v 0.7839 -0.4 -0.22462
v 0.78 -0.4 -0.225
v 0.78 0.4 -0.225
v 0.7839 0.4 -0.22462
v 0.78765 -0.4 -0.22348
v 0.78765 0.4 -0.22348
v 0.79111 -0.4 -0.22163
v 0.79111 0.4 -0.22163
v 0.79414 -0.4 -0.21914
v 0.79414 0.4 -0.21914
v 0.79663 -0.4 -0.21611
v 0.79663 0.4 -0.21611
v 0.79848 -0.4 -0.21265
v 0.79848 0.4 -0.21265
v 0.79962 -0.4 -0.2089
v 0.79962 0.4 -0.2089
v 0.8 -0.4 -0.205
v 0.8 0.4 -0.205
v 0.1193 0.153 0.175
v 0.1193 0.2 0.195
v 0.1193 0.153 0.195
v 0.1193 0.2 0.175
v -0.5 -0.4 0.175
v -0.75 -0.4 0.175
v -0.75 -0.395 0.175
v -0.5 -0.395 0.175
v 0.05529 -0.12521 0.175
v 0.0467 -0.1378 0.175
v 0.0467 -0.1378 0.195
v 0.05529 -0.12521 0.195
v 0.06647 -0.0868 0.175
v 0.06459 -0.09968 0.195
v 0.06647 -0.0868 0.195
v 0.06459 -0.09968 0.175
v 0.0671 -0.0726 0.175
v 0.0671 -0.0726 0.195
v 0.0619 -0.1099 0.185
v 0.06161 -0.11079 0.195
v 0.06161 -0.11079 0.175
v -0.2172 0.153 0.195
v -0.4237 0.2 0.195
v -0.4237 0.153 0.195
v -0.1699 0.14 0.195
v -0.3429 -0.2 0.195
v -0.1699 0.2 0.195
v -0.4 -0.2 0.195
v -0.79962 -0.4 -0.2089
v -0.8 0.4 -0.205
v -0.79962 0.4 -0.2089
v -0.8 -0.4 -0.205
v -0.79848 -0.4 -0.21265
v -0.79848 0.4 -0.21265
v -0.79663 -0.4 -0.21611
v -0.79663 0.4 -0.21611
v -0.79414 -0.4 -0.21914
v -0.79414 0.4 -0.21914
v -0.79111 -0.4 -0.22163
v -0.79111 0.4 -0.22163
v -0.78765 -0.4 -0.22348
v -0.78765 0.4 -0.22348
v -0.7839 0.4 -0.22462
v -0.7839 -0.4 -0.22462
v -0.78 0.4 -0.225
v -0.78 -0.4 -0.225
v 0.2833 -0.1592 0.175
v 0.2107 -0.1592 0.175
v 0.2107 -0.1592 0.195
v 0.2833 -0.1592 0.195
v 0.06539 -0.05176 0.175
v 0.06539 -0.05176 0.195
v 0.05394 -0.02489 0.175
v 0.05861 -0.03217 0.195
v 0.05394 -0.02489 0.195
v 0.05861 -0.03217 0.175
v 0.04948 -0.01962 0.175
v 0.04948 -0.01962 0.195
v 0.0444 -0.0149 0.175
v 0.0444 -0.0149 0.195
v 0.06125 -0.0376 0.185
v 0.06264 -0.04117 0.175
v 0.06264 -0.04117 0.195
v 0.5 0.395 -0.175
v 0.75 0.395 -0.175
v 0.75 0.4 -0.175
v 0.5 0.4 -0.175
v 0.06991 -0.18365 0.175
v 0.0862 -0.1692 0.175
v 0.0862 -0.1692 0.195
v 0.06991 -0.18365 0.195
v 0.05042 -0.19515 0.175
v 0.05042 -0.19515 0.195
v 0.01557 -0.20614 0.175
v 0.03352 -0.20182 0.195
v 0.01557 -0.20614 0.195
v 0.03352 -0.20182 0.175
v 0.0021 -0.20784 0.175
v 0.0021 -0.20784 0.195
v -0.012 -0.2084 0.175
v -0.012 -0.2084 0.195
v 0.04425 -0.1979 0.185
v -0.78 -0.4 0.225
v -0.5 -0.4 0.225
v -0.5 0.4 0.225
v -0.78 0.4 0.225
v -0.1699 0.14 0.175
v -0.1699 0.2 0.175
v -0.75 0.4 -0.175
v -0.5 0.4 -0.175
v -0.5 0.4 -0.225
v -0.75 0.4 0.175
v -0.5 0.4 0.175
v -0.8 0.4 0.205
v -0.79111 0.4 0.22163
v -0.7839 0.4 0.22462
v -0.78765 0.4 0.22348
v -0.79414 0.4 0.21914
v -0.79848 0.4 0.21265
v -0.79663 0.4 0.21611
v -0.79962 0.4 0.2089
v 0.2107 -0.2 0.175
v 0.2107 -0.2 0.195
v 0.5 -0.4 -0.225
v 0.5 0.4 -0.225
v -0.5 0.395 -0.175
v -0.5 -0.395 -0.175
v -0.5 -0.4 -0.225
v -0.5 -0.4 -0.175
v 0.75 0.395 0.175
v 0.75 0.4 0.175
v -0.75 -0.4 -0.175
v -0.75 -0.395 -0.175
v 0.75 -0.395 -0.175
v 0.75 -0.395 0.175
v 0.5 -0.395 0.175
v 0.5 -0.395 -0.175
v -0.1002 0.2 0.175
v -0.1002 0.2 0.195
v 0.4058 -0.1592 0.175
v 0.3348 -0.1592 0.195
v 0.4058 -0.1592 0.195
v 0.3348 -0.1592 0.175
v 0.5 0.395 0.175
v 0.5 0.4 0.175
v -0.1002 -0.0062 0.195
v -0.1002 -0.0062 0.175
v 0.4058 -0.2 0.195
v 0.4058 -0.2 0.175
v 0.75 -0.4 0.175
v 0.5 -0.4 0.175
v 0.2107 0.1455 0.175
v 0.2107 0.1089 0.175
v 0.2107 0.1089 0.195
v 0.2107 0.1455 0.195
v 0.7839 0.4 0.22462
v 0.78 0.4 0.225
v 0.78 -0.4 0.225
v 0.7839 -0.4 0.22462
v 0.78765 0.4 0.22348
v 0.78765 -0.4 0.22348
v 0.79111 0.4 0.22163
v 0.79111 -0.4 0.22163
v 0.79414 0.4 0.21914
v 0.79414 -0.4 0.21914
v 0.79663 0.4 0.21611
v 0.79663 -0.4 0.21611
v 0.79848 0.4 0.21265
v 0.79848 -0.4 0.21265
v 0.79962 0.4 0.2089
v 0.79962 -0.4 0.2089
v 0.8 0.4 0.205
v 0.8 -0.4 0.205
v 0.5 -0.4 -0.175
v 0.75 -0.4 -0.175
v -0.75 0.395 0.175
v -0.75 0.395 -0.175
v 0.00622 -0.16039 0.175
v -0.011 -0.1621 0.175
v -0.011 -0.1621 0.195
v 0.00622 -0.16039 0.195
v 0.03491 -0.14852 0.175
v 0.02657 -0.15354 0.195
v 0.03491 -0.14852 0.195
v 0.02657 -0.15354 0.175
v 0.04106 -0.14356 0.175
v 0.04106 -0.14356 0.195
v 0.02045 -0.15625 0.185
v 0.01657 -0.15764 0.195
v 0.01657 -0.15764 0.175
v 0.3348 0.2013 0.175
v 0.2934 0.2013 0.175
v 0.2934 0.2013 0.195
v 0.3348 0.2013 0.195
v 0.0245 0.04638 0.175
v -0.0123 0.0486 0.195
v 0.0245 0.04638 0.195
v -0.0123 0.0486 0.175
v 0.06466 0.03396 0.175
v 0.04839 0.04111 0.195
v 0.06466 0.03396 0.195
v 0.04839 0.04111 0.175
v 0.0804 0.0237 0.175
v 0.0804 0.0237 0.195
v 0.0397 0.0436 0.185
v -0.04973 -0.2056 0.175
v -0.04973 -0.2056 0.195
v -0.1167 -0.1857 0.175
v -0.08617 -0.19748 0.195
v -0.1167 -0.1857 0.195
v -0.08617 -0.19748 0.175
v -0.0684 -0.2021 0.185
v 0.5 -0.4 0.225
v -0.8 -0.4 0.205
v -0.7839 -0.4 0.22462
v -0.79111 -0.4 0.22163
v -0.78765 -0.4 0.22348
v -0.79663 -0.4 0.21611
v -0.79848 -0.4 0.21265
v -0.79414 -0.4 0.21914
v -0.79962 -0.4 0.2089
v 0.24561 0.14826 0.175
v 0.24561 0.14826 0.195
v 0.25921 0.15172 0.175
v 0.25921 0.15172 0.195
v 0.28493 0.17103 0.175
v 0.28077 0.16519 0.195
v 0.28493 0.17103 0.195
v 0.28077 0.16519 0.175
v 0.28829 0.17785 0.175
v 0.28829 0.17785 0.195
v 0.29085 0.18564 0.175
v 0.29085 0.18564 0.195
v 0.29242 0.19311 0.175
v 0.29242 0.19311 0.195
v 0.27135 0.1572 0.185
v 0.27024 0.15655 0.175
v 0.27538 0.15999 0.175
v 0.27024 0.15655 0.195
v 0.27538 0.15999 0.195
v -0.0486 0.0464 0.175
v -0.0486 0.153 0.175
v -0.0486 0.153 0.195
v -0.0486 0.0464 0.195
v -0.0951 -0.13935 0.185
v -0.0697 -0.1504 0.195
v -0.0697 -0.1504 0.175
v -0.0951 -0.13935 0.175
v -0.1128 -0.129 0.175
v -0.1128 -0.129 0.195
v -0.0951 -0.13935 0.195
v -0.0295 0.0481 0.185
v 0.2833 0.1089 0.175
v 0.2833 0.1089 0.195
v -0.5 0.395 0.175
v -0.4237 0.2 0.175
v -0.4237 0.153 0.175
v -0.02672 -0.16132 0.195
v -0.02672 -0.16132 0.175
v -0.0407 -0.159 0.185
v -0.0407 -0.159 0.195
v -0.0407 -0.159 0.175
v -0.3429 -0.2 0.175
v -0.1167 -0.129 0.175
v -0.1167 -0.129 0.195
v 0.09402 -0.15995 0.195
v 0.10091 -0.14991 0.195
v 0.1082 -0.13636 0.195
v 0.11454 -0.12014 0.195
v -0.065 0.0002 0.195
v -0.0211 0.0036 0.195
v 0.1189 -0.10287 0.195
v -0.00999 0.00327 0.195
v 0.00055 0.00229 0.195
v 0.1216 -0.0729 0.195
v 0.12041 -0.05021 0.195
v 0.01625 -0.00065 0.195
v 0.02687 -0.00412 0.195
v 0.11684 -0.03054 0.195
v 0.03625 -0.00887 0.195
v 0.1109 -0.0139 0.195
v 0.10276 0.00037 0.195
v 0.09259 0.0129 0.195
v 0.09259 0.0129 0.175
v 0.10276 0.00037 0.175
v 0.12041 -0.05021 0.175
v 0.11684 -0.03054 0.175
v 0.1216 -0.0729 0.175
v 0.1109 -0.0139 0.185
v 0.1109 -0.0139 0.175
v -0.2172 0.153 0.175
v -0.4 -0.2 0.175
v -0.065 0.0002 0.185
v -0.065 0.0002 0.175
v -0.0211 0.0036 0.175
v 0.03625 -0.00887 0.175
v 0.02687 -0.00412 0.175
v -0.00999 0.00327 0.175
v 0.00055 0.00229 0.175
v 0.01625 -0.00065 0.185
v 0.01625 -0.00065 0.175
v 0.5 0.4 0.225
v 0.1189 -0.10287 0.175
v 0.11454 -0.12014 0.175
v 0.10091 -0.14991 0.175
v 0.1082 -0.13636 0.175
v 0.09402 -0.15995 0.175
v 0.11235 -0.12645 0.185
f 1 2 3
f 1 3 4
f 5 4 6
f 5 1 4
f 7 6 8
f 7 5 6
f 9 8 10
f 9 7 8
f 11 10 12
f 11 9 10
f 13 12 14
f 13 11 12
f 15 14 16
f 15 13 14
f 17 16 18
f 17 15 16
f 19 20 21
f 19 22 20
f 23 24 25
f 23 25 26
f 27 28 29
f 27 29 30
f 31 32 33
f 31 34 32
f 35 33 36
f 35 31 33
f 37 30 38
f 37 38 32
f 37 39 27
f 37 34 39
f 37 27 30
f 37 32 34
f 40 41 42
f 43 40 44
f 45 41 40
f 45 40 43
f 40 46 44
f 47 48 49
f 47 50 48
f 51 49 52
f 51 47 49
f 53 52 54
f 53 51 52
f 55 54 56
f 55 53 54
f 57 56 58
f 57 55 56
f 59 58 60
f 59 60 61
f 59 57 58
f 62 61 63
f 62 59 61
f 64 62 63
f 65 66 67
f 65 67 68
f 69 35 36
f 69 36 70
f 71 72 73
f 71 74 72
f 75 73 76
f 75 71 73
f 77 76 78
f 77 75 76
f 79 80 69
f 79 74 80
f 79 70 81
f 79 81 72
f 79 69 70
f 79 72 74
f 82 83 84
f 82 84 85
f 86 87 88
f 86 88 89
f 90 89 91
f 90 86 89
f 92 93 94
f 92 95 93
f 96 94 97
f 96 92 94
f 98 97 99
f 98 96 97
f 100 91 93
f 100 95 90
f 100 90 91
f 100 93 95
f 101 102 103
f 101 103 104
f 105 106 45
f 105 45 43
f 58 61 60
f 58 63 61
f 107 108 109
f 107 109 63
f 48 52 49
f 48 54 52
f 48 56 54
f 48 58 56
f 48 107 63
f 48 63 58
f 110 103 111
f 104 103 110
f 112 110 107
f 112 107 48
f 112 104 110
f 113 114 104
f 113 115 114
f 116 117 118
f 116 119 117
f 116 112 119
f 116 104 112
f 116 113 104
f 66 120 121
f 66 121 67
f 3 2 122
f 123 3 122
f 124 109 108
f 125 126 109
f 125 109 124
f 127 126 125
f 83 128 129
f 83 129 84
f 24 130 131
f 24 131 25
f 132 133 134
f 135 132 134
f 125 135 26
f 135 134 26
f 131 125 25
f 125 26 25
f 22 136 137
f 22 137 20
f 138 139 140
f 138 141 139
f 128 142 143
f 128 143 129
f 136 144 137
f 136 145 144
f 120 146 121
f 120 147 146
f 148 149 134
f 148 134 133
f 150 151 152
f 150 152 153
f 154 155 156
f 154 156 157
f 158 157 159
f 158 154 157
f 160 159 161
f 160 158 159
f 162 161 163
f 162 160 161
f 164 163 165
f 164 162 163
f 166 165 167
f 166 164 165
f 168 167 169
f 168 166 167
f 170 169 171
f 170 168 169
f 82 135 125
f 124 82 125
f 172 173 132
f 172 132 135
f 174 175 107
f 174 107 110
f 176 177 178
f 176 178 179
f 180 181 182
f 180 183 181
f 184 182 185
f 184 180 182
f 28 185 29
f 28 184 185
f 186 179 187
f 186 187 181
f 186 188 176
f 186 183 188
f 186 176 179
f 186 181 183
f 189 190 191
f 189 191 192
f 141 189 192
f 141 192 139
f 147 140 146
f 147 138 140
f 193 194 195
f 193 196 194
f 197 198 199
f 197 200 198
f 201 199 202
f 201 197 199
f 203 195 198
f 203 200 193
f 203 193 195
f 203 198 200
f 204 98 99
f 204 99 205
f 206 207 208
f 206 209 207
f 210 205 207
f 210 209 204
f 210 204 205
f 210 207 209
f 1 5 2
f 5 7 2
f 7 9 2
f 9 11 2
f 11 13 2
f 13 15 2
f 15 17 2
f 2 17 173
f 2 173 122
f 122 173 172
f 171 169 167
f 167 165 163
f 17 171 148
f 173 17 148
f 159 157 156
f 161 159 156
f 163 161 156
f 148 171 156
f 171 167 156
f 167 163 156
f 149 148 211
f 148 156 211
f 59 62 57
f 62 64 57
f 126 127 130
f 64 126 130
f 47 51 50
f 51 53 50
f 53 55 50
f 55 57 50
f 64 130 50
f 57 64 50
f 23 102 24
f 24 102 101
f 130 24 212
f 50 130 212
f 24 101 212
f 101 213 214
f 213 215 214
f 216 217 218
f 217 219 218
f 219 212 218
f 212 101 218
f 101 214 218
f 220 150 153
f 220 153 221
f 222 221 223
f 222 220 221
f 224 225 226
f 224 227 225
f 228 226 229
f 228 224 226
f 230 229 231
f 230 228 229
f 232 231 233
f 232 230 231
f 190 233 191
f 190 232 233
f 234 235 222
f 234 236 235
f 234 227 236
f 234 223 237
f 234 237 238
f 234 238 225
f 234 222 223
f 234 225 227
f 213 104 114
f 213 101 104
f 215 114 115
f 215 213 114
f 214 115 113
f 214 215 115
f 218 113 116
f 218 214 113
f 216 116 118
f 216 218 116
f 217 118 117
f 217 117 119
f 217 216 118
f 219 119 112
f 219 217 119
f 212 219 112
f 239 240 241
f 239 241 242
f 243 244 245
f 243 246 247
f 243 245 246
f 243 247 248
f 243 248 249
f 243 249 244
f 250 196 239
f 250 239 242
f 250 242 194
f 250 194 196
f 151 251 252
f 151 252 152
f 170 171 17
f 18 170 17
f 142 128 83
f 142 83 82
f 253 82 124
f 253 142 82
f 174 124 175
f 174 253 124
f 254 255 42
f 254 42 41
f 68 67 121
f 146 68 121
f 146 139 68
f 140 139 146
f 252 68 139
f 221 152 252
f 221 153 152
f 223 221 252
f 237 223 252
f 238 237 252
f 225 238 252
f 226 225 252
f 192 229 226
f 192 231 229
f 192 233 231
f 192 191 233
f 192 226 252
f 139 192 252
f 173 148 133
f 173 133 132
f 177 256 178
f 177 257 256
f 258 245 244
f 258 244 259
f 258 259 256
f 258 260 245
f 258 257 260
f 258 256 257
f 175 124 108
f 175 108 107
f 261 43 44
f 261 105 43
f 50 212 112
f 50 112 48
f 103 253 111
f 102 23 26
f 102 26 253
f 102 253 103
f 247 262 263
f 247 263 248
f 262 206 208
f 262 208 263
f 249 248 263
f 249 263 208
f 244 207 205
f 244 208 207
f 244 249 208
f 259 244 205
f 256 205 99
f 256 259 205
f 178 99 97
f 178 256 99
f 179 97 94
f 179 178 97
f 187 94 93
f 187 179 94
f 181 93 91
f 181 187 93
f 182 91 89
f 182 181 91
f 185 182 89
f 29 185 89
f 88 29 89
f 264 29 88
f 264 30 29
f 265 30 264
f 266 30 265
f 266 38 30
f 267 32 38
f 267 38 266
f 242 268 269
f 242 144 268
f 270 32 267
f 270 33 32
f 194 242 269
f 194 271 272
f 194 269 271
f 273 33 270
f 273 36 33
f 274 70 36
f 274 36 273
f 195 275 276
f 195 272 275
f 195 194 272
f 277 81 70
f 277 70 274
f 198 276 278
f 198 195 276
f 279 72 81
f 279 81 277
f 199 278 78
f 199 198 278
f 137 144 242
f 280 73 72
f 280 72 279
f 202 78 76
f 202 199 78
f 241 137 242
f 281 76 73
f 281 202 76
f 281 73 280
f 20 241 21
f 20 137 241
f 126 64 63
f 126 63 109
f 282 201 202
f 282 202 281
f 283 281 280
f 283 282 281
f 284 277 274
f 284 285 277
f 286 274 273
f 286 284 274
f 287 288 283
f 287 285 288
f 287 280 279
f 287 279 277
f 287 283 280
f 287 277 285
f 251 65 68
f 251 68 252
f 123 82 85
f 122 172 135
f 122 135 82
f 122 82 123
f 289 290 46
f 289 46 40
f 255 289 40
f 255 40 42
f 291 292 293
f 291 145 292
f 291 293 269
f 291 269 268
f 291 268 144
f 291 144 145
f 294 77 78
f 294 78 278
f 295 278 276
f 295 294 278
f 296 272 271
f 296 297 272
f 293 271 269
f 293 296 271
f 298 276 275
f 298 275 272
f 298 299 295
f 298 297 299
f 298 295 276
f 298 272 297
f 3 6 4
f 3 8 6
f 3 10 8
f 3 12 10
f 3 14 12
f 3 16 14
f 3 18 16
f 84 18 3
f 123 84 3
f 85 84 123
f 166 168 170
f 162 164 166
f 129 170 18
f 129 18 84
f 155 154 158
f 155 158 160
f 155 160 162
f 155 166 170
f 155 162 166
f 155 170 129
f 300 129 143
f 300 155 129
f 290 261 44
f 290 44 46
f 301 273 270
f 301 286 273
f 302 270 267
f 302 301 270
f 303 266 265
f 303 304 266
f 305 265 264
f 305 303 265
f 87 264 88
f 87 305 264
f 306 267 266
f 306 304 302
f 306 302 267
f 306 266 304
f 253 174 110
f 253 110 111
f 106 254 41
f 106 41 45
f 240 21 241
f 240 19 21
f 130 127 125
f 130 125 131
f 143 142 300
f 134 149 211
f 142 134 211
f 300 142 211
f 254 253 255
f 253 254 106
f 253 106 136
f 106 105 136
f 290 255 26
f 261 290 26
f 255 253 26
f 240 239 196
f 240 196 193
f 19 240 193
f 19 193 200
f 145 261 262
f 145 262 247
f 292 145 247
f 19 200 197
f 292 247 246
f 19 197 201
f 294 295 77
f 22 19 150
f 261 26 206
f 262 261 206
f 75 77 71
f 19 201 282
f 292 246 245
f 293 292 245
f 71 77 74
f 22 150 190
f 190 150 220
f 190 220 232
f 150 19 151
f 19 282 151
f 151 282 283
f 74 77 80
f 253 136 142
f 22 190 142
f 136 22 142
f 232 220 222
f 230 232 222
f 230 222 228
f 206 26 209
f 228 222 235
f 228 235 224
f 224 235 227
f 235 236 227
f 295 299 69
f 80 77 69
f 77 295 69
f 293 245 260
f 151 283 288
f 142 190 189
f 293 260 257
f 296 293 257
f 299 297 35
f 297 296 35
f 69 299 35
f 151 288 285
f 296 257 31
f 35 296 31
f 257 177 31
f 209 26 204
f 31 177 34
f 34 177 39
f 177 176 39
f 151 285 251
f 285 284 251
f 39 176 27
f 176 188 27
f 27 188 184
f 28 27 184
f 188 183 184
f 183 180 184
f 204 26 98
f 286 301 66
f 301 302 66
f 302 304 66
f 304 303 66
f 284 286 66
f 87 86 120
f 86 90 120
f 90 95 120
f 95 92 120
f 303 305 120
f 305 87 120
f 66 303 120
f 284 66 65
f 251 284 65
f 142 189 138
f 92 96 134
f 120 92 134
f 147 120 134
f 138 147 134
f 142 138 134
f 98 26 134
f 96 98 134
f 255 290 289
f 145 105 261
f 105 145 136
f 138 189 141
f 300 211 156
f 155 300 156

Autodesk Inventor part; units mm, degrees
ref_plane "YZ Plane" through (0, 0, 0) normal (1, 0, 0) x (0, 1, 0)
ref_plane "XZ Plane" through (0, 0, 0) normal (0, 1, 0) x (-1, 0, 0)
ref_plane "XY Plane" through (0, 0, 0) normal (0, 0, 1) x (1, 0, 0)
sketch "Sketch1" plane through (0, 0, 0) normal (0, 1, 0) x (-1, 0, 0)
  line L0 (0.75, 0.175) -> (-0.75, 0.175)
  line L1 (-0.75, 0.175) -> (-0.75, -0.175)
  line L2 (-0.75, -0.175) -> (0.75, -0.175)
  line L3 (0.75, -0.175) -> (0.75, 0.175)
  line L4 (0.5, 0.175) -> (0.5, 0.225)
  line L5 (0.5, 0.225) -> (0.8, 0.225)
  line L6 (0.8, 0.225) -> (0.8, -0.225)
  line L7 (0.8, -0.225) -> (0.5, -0.225)
  line L8 (0.5, -0.225) -> (0.5, -0.175)
  line L9 (-0.5, 0.175) -> (-0.5, 0.225)
  line L10 (-0.5, 0.225) -> (-0.8, 0.225)
  line L11 (-0.8, 0.225) -> (-0.8, -0.225)
  line L12 (-0.8, -0.225) -> (-0.5, -0.225)
  line L13 (-0.5, -0.175) -> (-0.5, -0.225)
  line L14 (0.5, 0.175) -> (-0.5, 0.175)
  point P0 (0, 0)
  point P1 (0, 0.175)
  point P2 (0.75, 0)
  dimension "d0" = 1.6
  dimension "d1" = 0.05
  dimension "d2" = 0.05
  dimension "d3" = 0.45
  dimension "d4" = 0.3
extrude "Extrusion1" add sketch "Sketch1" along normal mid plane 0.8 contours L0 L4 L5 L6 L7 L8 L2 L3 | L0 L1 L2 L13 L12 L11 L10 L9
extrude "Extrusion2" add sketch "Sketch1" along normal mid plane 0.79 contours L3 L2 L1 L0
sketch "Sketch2" plane through (-0.5, -0.395, 0.175) normal (0, 0, 1) x (1, 0, 0)
  line L0 (0, 0) -> (0, 0.79) projected
  line L1 (1, 0) -> (0, 0) projected
  line L2 (1, 0) -> (1, 0.79) projected
  line L3 (0, 0.79) -> (1, 0.79) projected
  line L4 (0, 0.395) -> (1, 0.395) construction
  line L5 (0.3301, 0.535) -> (0.1571, 0.195)
  line L6 (0.1571, 0.195) -> (0.1, 0.195)
  line L7 (0.1, 0.195) -> (0.2828, 0.548)
  line L8 (0.2828, 0.548) -> (0.0763, 0.548)
  line L9 (0.0763, 0.548) -> (0.0763, 0.595)
  line L10 (0.0763, 0.595) -> (0.3301, 0.595)
  line L11 (0.3301, 0.595) -> (0.3301, 0.535)
  spline S0 degree 2 poles (0.6216, 0.3221) (0.6216, 0.2932) (0.6031, 0.2439) (0.5862, 0.2258) knots 0 0 0 1 2 2 2
  spline S1 degree 2 poles (0.5862, 0.2258) (0.5694, 0.2076) (0.5191, 0.1866) (0.488, 0.1866) knots 0 0 0 1 2 2 2
  spline S2 degree 2 poles (0.488, 0.1866) (0.4595, 0.1866) (0.4037, 0.1992) (0.3833, 0.2093) knots 0 0 0 1 2 2 2
  line L12 (0.3833, 0.2093) -> (0.3833, 0.266)
  line L13 (0.3833, 0.266) -> (0.3872, 0.266)
  spline S3 degree 2 poles (0.3872, 0.266) (0.3934, 0.2615) (0.4164, 0.2498) (0.4303, 0.2446) knots 0 0 0 1 2 2 2
  spline S4 degree 2 poles (0.4303, 0.2446) (0.4462, 0.2391) (0.4724, 0.2329) (0.489, 0.2329) knots 0 0 0 1 2 2 2
  spline S5 degree 2 poles (0.489, 0.2329) (0.5052, 0.2329) (0.5357, 0.2446) (0.5467, 0.2572) knots 0 0 0 1 2 2 2
  spline S6 degree 2 poles (0.5467, 0.2572) (0.5567, 0.2692) (0.5671, 0.301) (0.5671, 0.3224) knots 0 0 0 1 2 2 2
  spline S7 degree 2 poles (0.5671, 0.3224) (0.5671, 0.3438) (0.5554, 0.371) (0.5444, 0.3801) knots 0 0 0 1 2 2 2
  spline S8 degree 2 poles (0.5444, 0.3801) (0.5331, 0.3901) (0.4994, 0.3986) (0.4789, 0.3986) knots 0 0 0 1 2 2 2
  spline S9 degree 2 poles (0.4789, 0.3986) (0.4569, 0.3986) (0.4131, 0.3918) (0.3998, 0.3888) knots 0 0 0 1 2 2 2
  line L14 (0.3998, 0.3888) -> (0.3998, 0.595)
  line L15 (0.3998, 0.595) -> (0.6193, 0.595)
  line L16 (0.6193, 0.595) -> (0.6193, 0.548)
  line L17 (0.6193, 0.548) -> (0.4514, 0.548)
  line L18 (0.4514, 0.548) -> (0.4514, 0.4414)
  spline S10 degree 2 poles (0.4514, 0.4414) (0.4611, 0.4426) (0.4799, 0.4436) (0.4877, 0.4436) knots 0 0 0 1 2 2 2
  spline S11 degree 2 poles (0.4877, 0.4436) (0.5185, 0.4436) (0.5609, 0.4336) (0.5804, 0.4187) knots 0 0 0 1 2 2 2
  spline S12 degree 2 poles (0.5804, 0.4187) (0.6002, 0.4038) (0.6216, 0.3584) (0.6216, 0.3221) knots 0 0 0 1 2 2 2
  line L19 (0.9058, 0.195) -> (0.7107, 0.195)
  line L20 (0.7107, 0.195) -> (0.7107, 0.2358)
  line L21 (0.7107, 0.2358) -> (0.7833, 0.2358)
  line L22 (0.7833, 0.2358) -> (0.7833, 0.5039)
  line L23 (0.7833, 0.5039) -> (0.7107, 0.5039)
  line L24 (0.7107, 0.5039) -> (0.7107, 0.5405)
  spline S13 degree 2 poles (0.7107, 0.5405) (0.7519, 0.5405) (0.7908, 0.5639) (0.7934, 0.5963) knots 0 0 0 1 2 2 2
  line L25 (0.7934, 0.5963) -> (0.8348, 0.5963)
  line L26 (0.8348, 0.5963) -> (0.8348, 0.2358)
  line L27 (0.8348, 0.2358) -> (0.9058, 0.2358)
  line L28 (0.9058, 0.2358) -> (0.9058, 0.195)
  point P0 (0.5, 0.395)
extrude "Extrusion3" add sketch "Sketch2" along normal blind 0.02 contours L5 L6 L7 L8 L9 L10 L11 | S0 S1 S2 L12 L13 S3 S4 S5 S6 S7 S8 S9 L14 L15 L16 L17 L18 S10 S11 S12 | L19 L20 L21 L22 L23 L24 S13 L25 L26 L27 L28
fillet "Fillet1" radius 0.02 4 edges at (-0.8, 0, 0.225) (-0.8, 0, -0.225) (0.8, 0, 0.225) (0.8, 0, -0.225)
equation "\"d2\" = d1"
properties part number "21-1001" material "Copper"
